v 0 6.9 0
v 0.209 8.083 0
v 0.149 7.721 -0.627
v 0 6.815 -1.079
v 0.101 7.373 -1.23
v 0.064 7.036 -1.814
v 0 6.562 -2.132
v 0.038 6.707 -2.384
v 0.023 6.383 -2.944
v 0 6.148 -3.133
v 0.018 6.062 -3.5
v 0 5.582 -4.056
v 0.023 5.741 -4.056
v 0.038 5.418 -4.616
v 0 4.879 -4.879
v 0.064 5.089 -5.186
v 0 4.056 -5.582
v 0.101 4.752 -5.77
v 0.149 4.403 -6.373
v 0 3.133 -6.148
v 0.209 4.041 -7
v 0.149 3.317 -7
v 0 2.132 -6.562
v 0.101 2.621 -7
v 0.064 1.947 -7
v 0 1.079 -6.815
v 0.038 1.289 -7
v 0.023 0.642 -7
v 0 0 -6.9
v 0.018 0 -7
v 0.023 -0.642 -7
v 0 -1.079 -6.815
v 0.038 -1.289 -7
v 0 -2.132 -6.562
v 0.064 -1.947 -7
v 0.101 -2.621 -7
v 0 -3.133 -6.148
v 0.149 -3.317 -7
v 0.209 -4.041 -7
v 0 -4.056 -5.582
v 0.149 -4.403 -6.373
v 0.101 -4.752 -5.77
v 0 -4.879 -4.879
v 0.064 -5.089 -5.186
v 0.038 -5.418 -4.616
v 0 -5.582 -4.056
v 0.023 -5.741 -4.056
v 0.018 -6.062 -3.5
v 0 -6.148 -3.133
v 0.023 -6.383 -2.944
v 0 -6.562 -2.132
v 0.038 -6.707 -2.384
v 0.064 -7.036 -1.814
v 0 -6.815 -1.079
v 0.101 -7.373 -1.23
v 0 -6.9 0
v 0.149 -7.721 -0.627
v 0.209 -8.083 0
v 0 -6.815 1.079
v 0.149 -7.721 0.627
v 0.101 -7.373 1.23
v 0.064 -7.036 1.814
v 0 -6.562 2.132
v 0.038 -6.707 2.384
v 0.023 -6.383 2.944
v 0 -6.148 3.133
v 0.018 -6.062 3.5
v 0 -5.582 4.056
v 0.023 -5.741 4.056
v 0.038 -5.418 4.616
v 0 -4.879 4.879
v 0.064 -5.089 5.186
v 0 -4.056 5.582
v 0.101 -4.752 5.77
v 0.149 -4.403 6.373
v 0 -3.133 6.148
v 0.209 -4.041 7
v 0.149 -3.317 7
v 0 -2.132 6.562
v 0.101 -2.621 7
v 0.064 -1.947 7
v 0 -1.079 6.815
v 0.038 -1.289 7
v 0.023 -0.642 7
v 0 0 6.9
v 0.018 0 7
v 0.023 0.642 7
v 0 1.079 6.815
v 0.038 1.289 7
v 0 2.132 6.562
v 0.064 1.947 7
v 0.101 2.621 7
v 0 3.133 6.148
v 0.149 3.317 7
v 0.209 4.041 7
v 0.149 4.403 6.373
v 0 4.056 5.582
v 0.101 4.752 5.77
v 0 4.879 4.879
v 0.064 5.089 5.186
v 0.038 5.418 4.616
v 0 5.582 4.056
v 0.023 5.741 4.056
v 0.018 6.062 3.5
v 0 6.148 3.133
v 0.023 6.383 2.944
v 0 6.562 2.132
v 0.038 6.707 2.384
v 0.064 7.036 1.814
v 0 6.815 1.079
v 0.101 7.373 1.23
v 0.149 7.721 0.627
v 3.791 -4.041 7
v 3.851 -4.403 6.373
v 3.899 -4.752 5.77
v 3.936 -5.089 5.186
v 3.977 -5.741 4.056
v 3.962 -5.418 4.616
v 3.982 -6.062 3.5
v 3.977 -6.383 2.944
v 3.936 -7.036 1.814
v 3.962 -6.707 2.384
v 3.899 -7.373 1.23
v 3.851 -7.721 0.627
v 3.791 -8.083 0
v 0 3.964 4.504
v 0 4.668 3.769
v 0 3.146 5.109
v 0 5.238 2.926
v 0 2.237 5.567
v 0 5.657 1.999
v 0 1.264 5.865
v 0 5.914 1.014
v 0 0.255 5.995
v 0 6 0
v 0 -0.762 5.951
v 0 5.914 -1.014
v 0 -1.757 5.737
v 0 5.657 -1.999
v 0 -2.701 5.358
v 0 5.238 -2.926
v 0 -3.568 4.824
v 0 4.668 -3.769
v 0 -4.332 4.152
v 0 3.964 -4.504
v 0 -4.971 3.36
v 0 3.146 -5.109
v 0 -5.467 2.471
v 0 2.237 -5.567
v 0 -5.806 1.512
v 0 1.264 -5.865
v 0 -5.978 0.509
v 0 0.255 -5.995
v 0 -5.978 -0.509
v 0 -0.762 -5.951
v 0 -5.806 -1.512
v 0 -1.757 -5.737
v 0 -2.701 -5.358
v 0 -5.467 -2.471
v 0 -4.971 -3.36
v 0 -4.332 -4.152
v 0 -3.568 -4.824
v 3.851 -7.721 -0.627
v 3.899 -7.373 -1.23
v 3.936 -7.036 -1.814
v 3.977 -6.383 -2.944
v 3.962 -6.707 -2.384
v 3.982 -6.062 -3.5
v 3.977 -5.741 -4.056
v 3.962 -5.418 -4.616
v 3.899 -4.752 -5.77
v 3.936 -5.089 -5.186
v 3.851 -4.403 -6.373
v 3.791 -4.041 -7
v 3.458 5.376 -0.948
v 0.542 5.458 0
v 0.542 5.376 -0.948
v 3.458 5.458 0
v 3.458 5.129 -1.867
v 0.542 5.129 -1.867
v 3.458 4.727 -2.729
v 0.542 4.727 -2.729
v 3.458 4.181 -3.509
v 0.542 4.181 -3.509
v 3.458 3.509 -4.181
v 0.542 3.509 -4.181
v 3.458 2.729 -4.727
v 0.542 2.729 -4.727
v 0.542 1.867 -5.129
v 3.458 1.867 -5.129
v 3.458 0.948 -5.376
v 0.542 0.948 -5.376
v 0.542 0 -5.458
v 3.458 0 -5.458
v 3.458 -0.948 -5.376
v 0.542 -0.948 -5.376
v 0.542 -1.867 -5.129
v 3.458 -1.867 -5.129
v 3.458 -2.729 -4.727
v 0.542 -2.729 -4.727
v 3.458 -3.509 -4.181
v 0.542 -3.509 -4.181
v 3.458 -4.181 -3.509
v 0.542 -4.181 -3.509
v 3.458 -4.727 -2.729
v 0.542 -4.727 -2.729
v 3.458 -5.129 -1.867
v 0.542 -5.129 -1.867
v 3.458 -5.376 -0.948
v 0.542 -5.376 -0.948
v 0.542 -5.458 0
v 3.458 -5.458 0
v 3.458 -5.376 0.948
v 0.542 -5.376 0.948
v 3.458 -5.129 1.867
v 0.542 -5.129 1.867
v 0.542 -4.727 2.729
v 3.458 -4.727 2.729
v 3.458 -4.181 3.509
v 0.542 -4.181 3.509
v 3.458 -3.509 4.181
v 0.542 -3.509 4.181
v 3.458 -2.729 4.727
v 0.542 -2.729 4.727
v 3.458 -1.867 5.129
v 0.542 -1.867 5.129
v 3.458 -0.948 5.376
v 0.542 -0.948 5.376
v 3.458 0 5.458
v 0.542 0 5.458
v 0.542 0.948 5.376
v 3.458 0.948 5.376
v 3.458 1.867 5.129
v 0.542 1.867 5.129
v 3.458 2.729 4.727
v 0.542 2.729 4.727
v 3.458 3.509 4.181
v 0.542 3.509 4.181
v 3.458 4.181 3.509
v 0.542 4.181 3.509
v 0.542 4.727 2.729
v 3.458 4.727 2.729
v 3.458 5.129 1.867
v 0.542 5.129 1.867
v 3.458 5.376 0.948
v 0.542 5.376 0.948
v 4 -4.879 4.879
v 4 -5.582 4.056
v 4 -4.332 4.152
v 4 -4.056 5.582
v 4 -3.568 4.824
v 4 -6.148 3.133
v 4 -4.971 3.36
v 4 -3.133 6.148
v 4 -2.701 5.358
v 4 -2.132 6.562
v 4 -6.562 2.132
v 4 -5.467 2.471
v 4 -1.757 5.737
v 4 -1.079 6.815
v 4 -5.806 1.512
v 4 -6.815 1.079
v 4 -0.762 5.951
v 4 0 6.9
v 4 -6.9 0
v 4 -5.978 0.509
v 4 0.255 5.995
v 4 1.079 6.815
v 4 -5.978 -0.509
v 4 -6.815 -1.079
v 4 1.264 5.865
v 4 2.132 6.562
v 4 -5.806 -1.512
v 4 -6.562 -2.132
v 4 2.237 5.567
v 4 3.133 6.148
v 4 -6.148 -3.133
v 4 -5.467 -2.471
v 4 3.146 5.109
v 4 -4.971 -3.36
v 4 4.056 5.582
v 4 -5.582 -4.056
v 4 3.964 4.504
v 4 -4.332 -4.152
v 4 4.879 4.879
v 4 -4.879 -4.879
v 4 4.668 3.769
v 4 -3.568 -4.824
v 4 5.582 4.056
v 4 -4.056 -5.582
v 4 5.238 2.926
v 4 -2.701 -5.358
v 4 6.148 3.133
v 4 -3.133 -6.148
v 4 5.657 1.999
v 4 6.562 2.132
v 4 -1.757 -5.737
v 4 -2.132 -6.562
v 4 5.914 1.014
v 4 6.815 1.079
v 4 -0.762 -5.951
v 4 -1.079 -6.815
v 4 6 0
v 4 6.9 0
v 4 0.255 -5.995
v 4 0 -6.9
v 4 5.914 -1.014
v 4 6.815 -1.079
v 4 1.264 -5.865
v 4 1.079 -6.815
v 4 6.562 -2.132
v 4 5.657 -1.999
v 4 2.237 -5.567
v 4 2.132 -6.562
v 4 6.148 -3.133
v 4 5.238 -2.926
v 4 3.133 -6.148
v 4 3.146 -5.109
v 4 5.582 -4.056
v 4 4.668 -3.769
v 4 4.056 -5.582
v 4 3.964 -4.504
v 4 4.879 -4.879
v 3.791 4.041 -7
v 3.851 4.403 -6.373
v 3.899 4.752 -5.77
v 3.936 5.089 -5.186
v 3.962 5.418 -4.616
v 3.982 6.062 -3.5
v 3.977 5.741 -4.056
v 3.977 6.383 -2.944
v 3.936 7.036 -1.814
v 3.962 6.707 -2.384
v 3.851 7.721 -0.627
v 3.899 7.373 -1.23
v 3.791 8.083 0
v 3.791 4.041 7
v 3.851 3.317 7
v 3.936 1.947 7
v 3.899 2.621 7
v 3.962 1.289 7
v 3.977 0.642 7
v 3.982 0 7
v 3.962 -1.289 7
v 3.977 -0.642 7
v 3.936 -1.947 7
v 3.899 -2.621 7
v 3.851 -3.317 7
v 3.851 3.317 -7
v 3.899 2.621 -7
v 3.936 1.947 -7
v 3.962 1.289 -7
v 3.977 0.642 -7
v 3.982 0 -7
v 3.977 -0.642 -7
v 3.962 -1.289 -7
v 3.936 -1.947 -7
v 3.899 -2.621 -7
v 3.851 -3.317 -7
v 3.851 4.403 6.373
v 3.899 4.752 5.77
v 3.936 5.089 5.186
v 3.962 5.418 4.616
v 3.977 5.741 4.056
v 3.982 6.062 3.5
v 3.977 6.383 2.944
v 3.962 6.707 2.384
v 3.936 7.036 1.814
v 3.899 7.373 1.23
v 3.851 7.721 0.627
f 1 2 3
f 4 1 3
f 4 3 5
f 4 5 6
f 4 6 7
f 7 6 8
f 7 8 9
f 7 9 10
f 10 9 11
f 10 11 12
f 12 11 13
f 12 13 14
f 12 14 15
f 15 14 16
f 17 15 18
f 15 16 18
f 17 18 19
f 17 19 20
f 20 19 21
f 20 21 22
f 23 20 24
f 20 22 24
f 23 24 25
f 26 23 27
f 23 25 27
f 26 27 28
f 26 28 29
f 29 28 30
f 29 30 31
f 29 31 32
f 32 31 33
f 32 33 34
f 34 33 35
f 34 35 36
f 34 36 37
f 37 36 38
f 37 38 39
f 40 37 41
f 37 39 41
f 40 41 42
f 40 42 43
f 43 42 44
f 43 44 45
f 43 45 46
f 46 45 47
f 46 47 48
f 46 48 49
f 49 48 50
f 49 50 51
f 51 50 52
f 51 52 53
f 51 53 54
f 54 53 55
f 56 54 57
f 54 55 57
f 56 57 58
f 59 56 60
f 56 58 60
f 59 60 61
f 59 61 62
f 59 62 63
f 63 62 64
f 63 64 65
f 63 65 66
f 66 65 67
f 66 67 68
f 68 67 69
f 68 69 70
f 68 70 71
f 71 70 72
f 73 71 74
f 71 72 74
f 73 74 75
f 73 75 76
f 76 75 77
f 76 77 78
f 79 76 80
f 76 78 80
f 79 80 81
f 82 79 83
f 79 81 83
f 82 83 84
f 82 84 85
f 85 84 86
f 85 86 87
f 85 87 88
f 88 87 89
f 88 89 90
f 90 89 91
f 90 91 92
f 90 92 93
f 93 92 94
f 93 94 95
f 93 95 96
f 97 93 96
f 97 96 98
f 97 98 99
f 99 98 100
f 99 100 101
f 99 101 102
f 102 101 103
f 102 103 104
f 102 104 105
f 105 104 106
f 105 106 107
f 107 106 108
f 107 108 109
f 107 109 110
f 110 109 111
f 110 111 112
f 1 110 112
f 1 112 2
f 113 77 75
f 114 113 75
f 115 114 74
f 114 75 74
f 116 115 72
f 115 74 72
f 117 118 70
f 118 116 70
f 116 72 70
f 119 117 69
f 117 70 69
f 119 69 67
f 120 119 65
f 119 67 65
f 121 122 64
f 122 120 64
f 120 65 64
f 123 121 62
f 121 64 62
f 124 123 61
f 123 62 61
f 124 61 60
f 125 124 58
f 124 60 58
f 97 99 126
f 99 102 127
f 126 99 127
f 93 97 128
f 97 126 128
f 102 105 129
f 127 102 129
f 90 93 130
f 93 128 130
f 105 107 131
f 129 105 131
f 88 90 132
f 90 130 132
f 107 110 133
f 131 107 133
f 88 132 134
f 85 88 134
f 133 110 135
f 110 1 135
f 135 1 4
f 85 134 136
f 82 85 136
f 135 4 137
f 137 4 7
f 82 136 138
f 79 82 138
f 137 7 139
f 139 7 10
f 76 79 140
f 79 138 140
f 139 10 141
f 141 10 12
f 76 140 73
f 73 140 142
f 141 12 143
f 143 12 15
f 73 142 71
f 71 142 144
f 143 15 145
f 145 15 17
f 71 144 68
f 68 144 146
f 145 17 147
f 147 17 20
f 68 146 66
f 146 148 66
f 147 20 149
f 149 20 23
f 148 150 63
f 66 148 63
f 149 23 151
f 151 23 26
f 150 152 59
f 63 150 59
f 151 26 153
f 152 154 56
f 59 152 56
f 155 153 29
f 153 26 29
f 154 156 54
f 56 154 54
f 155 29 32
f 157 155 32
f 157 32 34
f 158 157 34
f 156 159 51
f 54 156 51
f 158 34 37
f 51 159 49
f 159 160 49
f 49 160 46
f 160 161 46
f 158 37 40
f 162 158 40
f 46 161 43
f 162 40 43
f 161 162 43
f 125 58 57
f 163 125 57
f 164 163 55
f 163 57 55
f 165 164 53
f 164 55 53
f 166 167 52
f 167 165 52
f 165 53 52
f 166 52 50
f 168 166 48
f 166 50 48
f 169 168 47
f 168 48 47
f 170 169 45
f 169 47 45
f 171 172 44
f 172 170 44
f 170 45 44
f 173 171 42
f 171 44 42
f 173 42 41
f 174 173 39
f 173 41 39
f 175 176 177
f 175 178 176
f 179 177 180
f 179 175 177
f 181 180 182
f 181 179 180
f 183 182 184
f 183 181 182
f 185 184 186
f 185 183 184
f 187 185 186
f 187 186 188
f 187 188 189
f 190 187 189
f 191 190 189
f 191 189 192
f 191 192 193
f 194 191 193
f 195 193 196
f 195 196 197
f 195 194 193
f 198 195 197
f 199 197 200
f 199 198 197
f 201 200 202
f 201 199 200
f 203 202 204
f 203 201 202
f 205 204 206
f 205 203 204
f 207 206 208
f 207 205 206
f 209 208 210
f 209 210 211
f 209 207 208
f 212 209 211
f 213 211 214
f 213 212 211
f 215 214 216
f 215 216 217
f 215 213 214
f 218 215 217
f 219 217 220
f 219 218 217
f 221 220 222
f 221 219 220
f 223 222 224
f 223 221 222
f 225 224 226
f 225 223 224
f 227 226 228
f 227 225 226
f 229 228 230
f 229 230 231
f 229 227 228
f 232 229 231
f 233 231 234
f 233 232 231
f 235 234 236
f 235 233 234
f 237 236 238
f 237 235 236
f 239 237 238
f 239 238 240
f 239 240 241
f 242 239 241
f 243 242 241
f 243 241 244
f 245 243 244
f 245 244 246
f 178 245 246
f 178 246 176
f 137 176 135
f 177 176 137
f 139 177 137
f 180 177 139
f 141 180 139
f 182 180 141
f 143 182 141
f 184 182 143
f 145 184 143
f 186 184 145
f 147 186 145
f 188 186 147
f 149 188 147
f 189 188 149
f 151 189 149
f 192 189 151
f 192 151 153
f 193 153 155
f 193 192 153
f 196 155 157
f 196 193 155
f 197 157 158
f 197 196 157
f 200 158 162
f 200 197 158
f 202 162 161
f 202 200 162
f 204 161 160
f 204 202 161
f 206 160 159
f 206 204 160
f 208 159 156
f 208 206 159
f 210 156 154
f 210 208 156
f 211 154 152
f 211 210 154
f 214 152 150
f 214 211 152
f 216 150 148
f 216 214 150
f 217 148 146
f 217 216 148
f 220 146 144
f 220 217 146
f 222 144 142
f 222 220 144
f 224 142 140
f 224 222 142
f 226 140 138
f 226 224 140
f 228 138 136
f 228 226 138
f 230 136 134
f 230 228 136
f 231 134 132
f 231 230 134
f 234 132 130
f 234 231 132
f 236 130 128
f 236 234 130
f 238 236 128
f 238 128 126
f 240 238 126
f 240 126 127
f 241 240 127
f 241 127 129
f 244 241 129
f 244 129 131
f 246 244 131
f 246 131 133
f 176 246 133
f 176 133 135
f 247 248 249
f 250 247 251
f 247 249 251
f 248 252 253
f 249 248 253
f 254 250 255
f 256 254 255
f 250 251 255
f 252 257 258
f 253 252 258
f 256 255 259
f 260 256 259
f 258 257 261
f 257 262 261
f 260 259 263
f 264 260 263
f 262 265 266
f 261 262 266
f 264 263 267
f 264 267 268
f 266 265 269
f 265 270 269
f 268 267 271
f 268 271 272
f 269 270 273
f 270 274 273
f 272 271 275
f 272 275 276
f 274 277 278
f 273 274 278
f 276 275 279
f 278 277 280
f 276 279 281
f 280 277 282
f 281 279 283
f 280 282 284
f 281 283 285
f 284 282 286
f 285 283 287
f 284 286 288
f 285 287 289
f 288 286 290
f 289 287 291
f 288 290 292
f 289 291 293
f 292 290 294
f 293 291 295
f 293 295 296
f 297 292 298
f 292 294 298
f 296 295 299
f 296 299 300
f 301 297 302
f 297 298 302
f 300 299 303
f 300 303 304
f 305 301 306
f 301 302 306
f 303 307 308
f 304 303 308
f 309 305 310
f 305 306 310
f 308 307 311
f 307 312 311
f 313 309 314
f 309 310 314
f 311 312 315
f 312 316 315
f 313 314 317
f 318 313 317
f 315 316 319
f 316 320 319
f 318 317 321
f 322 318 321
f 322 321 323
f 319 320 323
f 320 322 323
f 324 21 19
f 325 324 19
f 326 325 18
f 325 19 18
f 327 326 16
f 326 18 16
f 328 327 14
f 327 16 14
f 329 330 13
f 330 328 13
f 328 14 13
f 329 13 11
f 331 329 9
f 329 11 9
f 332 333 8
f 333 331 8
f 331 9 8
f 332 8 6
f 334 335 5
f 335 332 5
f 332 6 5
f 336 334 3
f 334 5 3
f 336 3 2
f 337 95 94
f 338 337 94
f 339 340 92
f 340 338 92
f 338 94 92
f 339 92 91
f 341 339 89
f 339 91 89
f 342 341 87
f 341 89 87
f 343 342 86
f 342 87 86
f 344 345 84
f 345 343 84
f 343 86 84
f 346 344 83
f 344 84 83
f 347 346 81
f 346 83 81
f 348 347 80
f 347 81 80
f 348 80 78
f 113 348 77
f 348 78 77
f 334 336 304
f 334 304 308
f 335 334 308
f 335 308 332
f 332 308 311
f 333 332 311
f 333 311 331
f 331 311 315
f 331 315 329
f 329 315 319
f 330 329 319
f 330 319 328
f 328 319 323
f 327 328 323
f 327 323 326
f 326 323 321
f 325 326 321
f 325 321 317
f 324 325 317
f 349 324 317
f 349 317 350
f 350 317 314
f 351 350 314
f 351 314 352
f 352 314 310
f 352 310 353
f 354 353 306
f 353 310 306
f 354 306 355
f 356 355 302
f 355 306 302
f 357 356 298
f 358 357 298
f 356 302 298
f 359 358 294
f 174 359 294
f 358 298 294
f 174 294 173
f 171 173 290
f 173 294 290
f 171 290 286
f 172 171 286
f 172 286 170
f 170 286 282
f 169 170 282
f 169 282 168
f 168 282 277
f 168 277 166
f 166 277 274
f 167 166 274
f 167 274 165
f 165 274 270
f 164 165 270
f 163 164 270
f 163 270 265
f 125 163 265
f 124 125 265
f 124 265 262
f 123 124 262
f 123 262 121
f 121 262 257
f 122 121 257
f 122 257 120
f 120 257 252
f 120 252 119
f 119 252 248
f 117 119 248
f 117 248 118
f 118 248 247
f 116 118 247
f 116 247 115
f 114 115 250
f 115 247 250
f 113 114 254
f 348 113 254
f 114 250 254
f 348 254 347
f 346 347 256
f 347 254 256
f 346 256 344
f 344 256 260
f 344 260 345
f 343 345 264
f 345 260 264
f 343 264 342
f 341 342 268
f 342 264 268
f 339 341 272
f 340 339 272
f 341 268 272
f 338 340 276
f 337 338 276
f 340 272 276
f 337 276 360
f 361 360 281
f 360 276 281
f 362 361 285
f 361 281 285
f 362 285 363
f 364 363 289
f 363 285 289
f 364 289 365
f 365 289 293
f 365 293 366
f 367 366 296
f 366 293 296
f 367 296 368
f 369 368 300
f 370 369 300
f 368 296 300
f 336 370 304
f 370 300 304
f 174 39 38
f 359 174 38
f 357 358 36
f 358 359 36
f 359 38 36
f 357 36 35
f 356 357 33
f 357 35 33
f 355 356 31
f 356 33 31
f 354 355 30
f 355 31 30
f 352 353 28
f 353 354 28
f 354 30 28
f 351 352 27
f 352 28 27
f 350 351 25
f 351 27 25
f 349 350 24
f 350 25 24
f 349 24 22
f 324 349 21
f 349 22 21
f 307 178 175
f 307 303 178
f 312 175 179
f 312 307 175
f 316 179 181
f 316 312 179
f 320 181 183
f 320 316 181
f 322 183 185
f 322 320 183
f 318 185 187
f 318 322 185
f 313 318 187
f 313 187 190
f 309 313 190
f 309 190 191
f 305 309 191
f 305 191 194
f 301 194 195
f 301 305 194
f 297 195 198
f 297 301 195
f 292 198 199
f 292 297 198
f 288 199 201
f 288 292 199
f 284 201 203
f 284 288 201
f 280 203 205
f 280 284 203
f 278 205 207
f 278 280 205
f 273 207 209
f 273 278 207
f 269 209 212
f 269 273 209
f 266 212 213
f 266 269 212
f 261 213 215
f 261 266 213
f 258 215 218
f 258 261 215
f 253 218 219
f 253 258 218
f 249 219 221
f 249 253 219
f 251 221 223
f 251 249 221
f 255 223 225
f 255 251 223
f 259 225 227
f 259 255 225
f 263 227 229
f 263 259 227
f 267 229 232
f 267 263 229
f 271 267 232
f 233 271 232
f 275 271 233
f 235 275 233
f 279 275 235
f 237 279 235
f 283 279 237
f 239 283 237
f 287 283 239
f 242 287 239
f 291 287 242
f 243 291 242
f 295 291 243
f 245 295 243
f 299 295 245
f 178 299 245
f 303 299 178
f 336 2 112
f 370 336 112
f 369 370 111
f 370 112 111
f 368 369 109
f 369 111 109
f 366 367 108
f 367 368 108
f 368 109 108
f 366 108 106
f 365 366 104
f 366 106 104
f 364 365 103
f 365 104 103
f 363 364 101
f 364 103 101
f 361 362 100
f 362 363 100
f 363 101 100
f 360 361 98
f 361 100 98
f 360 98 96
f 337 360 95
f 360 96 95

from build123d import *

# Parameters (mm, degrees)
SKETCH3_W          = 28
SKETCH3_H          = 28
CUT_EXTRUDE1_DEPTH = 4


with BuildPart() as part:
    # Sketch1 → Revolve1 (revolve)
    with BuildSketch(Plane.XY):
        Polygon((0, 0), (0, 6.9), (0.511348244, 9.8), (3.488651756, 9.8), (4, 6.9), (4, 0), align=None)
    revolve(axis=Axis((4, 0, 0), (-1, 0, 0)))

    # Sketch2 → Cut-Revolve1 (revolve, cut)
    with BuildSketch(Plane.XY):
        Polygon((0, 0), (0, 6), (0.5415, 5.4585), (3.4585, 5.4585), (4, 6), (4, 0), align=None)
    revolve(axis=Axis((4, 0, 0), (-1, 0, 0)), mode=Mode.SUBTRACT)

    # Sketch3 → Cut-Extrude1 (cut)
    with BuildSketch(Plane(origin=(0, 0, 0), x_dir=(0, 0, -1), z_dir=(1, 0, 0))):
        Rectangle(SKETCH3_W, SKETCH3_H)
        Polygon((-7, -4.041451884), (0, -8.082903769), (7, -4.041451884), (7, 4.041451884), (0, 8.082903769), (-7, 4.041451884), align=None, mode=Mode.SUBTRACT)
    extrude(amount=CUT_EXTRUDE1_DEPTH, mode=Mode.SUBTRACT)


solid = part.part
